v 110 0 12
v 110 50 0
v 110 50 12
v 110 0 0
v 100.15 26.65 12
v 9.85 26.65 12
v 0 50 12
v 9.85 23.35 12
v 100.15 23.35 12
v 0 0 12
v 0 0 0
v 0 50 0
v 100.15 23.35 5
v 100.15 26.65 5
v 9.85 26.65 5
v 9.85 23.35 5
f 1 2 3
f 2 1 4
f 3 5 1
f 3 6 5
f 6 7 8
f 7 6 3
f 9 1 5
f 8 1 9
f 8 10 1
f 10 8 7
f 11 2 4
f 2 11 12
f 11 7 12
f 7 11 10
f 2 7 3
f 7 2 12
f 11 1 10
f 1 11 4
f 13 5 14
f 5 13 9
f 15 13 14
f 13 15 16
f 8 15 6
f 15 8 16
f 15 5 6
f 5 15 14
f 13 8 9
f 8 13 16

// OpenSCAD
include <qr-matrix.scad>
// Original Layerline prototype; millimetres. No third-party geometry.
part="base"; qr=true; shape="rectangle"; width=90; height=110; thickness=3; clearance=.3;
$fn=48;
module outline(){if(shape=="arch")union(){square([width,height-width/2]);translate([width/2,height-width/2])circle(d=width);}else square([width,height]);}
if(part=="base")difference(){cube([110,50,12]);translate([10-clearance/2,25-thickness/2-clearance/2,5])cube([width+clearance,thickness+clearance,8]);}
if(part=="insert")union(){linear_extrude(thickness)outline();if(qr)translate([15,35,thickness])qr_matrix();translate([width/2,15,thickness])linear_extrude(.6)text("SCAN HERE",size=7,halign="center",font="Liberation Sans:style=Bold");}
